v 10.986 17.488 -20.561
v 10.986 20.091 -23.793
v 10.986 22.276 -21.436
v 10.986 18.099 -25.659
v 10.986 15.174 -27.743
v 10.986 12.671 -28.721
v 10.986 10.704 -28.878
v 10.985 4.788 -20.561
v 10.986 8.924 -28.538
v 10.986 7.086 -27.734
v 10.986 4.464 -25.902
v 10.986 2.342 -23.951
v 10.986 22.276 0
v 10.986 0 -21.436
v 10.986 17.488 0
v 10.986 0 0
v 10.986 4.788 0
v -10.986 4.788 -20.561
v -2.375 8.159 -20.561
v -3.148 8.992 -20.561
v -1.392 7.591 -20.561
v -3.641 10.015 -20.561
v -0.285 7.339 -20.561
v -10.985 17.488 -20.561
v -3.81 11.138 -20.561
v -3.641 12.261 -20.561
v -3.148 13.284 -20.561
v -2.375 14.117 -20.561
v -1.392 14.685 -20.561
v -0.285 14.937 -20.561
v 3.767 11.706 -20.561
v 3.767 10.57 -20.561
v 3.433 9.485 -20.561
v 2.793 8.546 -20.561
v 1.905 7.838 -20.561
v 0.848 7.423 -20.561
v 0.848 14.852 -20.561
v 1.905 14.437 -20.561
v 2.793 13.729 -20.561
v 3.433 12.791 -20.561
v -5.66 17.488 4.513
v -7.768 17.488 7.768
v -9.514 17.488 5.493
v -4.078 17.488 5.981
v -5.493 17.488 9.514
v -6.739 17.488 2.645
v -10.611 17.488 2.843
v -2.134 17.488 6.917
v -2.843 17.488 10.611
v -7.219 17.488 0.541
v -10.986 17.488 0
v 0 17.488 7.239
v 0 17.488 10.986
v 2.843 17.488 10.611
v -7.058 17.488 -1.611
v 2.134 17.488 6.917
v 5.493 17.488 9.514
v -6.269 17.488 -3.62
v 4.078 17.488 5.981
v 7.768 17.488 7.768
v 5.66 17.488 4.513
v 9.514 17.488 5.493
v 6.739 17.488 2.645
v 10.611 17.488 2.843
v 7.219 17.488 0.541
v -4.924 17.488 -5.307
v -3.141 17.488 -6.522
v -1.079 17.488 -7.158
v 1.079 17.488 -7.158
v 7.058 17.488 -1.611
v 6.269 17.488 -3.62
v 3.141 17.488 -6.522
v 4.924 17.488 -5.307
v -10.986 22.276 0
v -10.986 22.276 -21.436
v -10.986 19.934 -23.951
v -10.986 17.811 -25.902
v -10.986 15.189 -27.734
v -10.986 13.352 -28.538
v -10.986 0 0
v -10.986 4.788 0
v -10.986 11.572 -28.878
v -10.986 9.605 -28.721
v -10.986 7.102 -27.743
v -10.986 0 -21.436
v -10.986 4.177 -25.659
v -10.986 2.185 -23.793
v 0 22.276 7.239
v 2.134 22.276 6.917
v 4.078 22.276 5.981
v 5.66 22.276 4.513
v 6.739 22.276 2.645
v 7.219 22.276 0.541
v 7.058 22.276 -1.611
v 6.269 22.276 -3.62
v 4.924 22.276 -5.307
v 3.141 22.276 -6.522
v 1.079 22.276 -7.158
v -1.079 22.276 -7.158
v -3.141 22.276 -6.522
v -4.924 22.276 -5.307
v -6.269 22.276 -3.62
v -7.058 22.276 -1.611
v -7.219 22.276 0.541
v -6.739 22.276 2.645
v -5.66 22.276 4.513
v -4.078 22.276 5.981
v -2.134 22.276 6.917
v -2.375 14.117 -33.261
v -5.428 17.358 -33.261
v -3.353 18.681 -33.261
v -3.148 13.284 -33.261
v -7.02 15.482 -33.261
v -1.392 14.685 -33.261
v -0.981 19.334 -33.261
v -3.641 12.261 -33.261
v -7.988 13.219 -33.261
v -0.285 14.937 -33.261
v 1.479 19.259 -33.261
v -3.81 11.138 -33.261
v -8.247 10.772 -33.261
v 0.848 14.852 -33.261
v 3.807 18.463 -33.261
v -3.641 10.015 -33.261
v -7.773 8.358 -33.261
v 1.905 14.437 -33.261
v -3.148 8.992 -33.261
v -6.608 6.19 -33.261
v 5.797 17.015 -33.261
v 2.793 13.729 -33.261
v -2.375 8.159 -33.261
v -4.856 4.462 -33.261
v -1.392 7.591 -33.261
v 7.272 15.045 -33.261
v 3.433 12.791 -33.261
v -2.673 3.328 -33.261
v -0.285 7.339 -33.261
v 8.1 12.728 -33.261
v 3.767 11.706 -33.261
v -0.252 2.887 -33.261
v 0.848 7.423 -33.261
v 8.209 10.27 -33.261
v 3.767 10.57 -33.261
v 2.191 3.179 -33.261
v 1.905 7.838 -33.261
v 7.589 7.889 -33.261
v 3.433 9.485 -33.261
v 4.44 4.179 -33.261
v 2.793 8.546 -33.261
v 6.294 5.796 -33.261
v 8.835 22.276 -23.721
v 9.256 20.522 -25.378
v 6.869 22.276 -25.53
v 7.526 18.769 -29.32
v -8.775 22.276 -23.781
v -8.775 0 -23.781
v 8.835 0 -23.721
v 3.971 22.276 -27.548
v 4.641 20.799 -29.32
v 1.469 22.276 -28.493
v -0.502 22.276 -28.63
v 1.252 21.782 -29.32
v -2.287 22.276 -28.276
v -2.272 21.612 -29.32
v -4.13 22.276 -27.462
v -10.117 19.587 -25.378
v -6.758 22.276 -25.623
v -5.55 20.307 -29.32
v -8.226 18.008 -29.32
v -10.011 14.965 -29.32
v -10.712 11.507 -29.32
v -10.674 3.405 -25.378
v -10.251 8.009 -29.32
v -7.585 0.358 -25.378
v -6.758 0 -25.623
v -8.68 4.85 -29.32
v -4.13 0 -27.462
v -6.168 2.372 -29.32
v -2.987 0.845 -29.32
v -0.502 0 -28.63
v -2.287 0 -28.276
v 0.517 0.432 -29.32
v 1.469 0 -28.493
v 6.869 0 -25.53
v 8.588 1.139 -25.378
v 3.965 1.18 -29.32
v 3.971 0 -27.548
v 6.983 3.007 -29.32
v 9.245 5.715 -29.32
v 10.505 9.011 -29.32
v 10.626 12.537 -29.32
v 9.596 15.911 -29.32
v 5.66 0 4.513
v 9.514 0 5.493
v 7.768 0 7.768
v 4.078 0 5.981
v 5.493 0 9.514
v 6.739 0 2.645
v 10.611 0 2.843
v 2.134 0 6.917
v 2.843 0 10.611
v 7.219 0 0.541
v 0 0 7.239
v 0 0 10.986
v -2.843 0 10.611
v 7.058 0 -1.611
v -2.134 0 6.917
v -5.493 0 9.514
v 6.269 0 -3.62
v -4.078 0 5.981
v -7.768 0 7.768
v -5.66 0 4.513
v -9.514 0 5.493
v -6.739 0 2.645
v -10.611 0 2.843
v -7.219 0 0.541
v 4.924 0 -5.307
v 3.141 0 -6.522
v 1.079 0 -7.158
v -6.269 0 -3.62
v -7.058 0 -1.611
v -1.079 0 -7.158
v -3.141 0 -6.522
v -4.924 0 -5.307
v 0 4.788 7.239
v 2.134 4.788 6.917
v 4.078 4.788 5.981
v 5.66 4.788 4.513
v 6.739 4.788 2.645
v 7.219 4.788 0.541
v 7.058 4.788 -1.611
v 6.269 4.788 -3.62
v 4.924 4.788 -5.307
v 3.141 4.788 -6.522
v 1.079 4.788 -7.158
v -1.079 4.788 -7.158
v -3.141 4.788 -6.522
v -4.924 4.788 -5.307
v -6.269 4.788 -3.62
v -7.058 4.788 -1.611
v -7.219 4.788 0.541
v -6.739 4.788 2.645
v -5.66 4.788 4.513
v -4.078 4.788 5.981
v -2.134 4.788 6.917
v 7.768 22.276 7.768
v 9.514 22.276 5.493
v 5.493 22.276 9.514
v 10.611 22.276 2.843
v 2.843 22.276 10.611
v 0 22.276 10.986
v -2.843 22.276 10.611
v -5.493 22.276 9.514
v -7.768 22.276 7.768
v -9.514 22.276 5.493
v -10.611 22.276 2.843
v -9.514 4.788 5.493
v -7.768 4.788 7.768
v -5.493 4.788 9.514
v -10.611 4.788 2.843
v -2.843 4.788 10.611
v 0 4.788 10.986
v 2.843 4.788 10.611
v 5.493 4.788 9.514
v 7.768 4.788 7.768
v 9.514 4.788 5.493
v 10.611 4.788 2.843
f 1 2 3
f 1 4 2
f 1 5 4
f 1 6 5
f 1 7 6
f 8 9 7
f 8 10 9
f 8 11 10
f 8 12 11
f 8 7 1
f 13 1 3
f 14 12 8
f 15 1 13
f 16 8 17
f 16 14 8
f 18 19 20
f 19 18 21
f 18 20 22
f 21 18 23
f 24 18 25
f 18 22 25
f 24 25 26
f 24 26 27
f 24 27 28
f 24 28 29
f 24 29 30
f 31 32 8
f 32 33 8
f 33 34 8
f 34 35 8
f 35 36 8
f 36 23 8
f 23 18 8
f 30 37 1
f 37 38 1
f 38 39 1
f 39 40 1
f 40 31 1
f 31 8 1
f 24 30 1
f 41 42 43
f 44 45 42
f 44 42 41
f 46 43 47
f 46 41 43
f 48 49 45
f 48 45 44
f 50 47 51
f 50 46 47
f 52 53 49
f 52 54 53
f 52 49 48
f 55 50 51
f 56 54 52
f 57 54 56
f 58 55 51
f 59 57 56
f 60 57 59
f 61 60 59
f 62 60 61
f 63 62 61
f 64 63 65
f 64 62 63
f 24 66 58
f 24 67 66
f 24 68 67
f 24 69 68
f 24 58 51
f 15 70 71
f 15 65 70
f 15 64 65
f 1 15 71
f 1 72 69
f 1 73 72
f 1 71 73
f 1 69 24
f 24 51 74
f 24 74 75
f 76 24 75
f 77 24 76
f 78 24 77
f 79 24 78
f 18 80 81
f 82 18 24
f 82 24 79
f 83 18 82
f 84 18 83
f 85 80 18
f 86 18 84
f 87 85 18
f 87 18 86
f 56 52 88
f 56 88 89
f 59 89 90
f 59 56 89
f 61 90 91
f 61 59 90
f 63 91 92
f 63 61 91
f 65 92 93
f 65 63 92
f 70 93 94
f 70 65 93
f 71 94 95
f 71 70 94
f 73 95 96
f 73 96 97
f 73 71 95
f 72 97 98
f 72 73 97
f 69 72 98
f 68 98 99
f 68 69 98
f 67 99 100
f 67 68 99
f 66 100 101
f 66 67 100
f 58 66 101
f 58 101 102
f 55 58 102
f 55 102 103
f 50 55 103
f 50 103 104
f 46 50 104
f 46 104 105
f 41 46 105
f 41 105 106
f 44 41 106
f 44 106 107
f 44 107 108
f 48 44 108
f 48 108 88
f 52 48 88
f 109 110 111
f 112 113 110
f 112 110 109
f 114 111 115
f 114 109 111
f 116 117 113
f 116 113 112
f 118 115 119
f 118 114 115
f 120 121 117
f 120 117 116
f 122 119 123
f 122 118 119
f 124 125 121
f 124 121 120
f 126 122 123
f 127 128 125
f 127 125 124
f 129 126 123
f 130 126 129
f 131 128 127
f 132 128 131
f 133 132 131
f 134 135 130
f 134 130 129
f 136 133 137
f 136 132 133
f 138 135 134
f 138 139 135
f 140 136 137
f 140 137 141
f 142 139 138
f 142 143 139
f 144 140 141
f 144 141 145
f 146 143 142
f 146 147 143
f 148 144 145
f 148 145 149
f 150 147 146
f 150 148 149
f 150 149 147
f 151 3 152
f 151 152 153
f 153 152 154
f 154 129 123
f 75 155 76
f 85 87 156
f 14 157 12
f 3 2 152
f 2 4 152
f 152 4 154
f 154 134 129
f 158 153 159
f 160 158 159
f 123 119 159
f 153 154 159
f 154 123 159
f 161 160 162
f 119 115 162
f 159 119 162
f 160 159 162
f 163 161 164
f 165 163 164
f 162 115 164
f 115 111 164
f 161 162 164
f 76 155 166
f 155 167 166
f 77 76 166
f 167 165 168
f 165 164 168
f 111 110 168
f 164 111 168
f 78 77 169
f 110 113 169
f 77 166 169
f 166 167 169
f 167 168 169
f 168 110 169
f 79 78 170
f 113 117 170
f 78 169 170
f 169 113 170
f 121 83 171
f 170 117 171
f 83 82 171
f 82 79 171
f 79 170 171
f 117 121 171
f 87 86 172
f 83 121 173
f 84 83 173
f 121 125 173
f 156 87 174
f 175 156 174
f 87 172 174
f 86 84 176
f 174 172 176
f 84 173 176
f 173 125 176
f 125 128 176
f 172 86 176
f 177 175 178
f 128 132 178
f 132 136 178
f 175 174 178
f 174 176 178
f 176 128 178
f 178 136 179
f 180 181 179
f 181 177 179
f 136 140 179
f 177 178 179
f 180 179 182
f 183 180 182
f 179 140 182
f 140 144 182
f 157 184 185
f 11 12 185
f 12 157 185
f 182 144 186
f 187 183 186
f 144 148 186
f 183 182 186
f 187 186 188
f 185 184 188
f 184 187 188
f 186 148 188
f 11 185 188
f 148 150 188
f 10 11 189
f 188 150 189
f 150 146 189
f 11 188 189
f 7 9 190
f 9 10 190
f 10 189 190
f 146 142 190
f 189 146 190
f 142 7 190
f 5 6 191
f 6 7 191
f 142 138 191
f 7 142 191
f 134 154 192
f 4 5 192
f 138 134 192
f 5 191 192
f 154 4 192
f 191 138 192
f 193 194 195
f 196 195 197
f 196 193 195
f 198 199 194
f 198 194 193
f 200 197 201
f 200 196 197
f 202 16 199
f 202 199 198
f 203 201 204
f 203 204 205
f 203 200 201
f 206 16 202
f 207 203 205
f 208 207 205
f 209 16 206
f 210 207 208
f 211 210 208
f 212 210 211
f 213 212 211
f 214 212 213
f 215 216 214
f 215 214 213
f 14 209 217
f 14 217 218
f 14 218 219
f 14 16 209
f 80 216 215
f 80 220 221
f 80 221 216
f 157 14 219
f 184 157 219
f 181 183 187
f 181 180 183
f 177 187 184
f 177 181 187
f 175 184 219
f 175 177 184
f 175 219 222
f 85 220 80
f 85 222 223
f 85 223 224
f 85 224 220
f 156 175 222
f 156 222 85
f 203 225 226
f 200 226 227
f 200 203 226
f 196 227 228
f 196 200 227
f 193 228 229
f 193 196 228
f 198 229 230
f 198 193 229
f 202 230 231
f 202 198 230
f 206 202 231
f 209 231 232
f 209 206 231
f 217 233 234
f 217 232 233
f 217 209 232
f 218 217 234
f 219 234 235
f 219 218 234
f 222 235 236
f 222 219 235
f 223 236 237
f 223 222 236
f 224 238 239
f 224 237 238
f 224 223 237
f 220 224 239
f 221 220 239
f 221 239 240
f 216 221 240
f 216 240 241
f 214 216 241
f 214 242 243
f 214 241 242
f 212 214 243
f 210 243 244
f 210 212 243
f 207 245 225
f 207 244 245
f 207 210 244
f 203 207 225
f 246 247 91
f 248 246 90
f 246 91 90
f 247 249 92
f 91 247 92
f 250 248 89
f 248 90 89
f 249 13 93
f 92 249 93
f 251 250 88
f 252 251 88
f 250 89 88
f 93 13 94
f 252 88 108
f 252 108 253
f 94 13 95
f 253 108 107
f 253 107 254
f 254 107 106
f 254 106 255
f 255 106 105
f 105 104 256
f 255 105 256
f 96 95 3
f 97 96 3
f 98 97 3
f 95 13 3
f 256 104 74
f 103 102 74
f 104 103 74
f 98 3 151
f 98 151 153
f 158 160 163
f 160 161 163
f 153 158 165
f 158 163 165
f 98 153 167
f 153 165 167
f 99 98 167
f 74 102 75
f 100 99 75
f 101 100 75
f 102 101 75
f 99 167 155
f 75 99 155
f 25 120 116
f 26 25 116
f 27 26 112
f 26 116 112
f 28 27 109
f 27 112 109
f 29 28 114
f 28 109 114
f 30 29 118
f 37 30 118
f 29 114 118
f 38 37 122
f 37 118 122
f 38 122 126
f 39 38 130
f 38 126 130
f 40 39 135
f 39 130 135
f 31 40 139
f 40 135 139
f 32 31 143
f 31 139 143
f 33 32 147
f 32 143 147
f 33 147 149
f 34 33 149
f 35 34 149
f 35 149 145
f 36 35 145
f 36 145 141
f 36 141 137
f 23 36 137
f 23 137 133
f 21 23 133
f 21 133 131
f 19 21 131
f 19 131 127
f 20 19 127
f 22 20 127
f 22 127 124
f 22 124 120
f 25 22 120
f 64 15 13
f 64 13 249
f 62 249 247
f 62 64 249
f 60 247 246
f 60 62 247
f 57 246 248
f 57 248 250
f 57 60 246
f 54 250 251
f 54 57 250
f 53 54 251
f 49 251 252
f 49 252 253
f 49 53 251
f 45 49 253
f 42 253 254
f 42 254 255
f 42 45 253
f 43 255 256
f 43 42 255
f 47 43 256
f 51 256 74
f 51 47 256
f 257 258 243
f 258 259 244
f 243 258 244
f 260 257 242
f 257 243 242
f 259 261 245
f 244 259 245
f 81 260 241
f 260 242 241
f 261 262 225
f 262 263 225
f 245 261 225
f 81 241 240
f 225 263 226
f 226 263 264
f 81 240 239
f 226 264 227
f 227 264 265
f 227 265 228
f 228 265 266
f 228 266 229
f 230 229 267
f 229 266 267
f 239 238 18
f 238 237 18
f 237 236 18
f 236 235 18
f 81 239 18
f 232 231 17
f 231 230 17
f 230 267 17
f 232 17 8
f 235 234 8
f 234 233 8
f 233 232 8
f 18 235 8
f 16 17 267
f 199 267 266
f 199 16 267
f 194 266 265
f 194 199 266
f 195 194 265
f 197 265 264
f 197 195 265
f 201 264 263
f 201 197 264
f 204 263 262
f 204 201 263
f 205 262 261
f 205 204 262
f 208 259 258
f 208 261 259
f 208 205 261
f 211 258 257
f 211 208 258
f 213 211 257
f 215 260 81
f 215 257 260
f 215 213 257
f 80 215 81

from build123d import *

# Parameters (mm, degrees)
SKETCH1_R           = 7.239
BOSS_EXTRUDE1_DEPTH = 22.2758
SKETCH2_W           = 31.5468
SKETCH2_H           = 12.7
CUT_EXTRUDE1_DEPTH  = 12.7
CUT_EXTRUDE2_REACH  = 52.741
SKETCH7_R           = 3.81


with BuildPart() as part:
    # Sketch1 → Boss-Extrude1 (new body)
    with BuildSketch(Plane(origin=(0, 0, 0), x_dir=(1, 0, 0), z_dir=(0, 1, 0))):
        with BuildLine():
            Line((-10.9855, 0), (-10.9855, 33.2613))
            Line((-10.9855, 33.2613), (10.9855, 33.2613))
            Line((10.9855, 33.2613), (10.9855, 0))
            ThreePointArc((10.9855, 0), (0, -10.9855), (-10.9855, 0))
        make_face()
        with Locations(Location((0, 0, 0), (0, 0, 270))):
            Circle(SKETCH1_R, mode=Mode.SUBTRACT)
    extrude(amount=BOSS_EXTRUDE1_DEPTH)

    # Sketch2 → Cut-Extrude1 (cut, symmetric)
    with BuildSketch(Plane(origin=(0, 0, 0), x_dir=(0, 0, -1), z_dir=(1, 0, 0))):
        with Locations((4.7879, 11.1379)):
            Rectangle(SKETCH2_W, SKETCH2_H)
    extrude(amount=CUT_EXTRUDE1_DEPTH, both=True, mode=Mode.SUBTRACT)

    # Sketch5 → Cut-Revolve1 (revolve, cut)
    with BuildSketch(Plane(origin=(5.568421495, 5.492228727, 0), x_dir=(0, 0, 1), z_dir=(-0.7119608885898049, -0.7022191204449046, 0)), mode=Mode.PRIVATE) as cut_revolve1_sk:
        Polygon((-21.436464447, 23.57372651), (-33.2613, 16.184749181), (-33.2613, 23.57372651), align=None)
    revolve(cut_revolve1_sk.sketch.rotate(Axis((0, 11.1379, -33.2613), (0, 0, 1)), 270.789356568), axis=Axis((0, 11.1379, -33.2613), (0, 0, 1)), mode=Mode.SUBTRACT)

    # Sketch7 → Cut-Extrude2 (cut, up to next)
    with BuildSketch(Plane(origin=(0, 0, -33.2613), x_dir=(-1, 0, 0), z_dir=(0, 0, -1)), mode=Mode.PRIVATE) as cut_extrude2_sk1:
        with Locations((0, 11.1379)):
            Circle(SKETCH7_R)
    cut_extrude2_tool1 = extrude(cut_extrude2_sk1.sketch, amount=-CUT_EXTRUDE2_REACH, mode=Mode.PRIVATE) & part.part
    add(cut_extrude2_tool1.solids().sort_by_distance((0, 11.1379, -33.2613))[0], mode=Mode.SUBTRACT)


solid = part.part
